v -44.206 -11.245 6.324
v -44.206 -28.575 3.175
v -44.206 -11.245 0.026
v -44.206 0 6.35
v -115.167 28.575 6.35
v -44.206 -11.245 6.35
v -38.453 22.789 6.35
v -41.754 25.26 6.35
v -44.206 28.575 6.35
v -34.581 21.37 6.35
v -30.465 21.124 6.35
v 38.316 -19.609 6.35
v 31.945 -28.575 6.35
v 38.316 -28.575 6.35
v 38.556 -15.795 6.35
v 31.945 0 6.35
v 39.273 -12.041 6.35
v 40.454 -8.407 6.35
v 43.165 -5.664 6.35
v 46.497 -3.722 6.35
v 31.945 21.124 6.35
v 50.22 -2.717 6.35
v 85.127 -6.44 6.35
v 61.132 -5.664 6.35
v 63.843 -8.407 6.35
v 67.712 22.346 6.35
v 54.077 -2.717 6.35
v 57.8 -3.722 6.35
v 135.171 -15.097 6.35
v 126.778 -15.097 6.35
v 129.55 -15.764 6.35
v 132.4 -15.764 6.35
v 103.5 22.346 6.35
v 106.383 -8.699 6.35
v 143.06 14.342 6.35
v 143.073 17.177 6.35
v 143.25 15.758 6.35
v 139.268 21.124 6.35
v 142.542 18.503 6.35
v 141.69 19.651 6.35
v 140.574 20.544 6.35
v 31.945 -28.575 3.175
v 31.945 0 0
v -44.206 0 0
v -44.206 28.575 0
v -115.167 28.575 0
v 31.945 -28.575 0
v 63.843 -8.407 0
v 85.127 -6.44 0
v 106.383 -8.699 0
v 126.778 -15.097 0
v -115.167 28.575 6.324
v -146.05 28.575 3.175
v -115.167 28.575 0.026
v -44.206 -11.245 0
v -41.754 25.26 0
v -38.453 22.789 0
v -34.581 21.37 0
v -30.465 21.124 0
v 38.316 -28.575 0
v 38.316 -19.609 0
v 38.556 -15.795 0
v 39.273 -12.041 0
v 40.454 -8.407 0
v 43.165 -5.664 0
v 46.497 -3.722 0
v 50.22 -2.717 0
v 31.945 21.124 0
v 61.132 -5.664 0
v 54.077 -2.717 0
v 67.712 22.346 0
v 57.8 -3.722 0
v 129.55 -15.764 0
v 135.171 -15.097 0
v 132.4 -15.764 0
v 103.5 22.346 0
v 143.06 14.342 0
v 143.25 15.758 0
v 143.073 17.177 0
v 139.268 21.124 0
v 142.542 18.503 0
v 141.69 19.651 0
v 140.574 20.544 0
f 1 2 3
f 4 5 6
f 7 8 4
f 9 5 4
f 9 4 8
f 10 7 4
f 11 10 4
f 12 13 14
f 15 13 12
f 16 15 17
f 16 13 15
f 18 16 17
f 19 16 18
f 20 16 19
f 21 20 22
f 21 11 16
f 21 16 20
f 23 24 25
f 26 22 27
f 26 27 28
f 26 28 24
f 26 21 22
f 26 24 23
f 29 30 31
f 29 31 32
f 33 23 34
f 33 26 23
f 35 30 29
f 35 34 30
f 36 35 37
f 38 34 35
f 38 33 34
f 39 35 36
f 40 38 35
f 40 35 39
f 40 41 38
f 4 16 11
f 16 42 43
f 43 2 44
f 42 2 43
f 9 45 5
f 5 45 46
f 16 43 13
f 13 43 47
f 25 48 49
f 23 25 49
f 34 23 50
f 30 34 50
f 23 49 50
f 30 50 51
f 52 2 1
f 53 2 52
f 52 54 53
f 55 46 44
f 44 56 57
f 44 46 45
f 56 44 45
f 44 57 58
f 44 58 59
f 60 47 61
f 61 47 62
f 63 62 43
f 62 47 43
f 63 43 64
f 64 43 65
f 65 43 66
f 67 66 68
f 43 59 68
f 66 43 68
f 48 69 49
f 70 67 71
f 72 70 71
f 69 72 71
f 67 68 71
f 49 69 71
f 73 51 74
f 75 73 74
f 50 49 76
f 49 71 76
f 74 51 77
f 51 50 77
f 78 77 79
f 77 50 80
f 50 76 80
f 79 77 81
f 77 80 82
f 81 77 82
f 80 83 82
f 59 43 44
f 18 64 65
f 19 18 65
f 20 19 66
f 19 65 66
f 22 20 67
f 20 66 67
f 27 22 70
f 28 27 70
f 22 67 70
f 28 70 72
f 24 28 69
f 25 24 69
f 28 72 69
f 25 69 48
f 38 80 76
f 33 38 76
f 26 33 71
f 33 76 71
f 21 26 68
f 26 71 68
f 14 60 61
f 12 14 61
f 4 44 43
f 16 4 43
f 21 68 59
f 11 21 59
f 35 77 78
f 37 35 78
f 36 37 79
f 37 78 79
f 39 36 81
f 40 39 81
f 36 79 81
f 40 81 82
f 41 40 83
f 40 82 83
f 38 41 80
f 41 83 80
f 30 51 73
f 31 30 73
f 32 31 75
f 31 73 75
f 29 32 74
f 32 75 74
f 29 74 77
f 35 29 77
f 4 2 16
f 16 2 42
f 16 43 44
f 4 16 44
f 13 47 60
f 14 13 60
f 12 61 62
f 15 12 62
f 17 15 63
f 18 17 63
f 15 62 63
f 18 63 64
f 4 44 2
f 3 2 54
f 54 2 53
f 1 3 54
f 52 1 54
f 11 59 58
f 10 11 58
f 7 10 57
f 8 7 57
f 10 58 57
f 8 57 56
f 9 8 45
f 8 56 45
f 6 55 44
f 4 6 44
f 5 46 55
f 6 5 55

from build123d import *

# Parameters (mm, degrees)
F1_DEPTH    = 6.35
F2_DEPTH    = 6.35
F3_T1_DEPTH = 195.9699169872
F4_DEPTH    = 6.35
F5_SIZE2    = 3.17499
F5_SIZE     = 28.57499
F5_2_SIZE2  = 3.17499
F5_2_SIZE   = 28.57499


# Not quite as in the source:
# - a fillet or chamfer that OpenCascade refuses, or shapes differently, is made with other operations: its cross-section is extruded or revolved along the edge and cut away or added
# - a fillet or chamfer is up to 0.001 mm smaller than in the source, because OpenCascade refuses the exact size


with BuildPart() as f1:
    # F0 (on Top) → F1 (new body)
    with BuildSketch(Plane.XY):
        with BuildLine():
            Line((31.9449827075, -10.0934877992), (31.9449827075, -28.575))
            Line((31.9449827075, -28.575), (38.3159667253, -28.575))
            Line((38.3159667253, -28.575), (38.3159667253, -19.608527422))
            ThreePointArc((38.3159667253, -19.608527422), (38.8553616261, -13.9065356822), (40.4544100165, -8.4068356082))
            ThreePointArc((40.4544100165, -8.4068356082), (52.1485507488, -2.5894110081), (63.8426914811, -8.4068356082))
            ThreePointArc((63.8426914811, -8.4068356082), (95.8112011226, -7.0427415694), (126.7784386873, -15.0973401847))
            ThreePointArc((126.7784386873, -15.0973401847), (130.9749132386, -15.8486915066), (135.1713877899, -15.0973401847))
            Line((135.1713877899, -15.0973401847), (143.0604755878, 14.3419522792))
            ThreePointArc((143.0604755878, 14.3419522792), (142.541612074, 18.5032028423), (139.2677277327, 21.1236812174))
            ThreePointArc((139.2677277327, 21.1236812174), (85.6063552201, 22.499320446), (31.9449827075, 21.1236812174))
            Line((31.9449827075, 21.1236812174), (-30.4647367448, 21.1236812174))
            ThreePointArc((-30.4647367448, 21.1236812174), (-38.4526509093, 22.7886386215), (-44.2056395113, 28.575))
            Line((-44.2056395113, 28.575), (-115.1673197746, 28.575))
            Line((-115.1673197746, 28.575), (-44.2056395113, -11.245172738))
            Line((-44.2056395113, -11.245172738), (-44.2056395113, 0))
            Line((-44.2056395113, 0), (31.9449827075, 0))
            Line((31.9449827075, 0), (31.9449827075, -10.0934877992))
        make_face()
    extrude(amount=F1_DEPTH)


with BuildPart() as f2:
    # F0 (on Top) → F2 (new body)
    with BuildSketch(Plane.XY):
        Polygon((-146.05, 28.575), (-44.2056395113, -28.575), (-44.2056395113, -11.245172738), (-115.1673197746, 28.575), align=None)
    extrude(amount=F2_DEPTH)

    # F3: chamfer of 3.175 x 15.24 on 2 edges, made by hand

    # F3_s2 → F3_t1 (cut)
    with BuildSketch(Plane(origin=(-157.7971410428, 88.547923197, 0), x_dir=(0, 0, 1), z_dir=(0.8720780049, -0.4893668903, 0))):
        Polygon((3.175, 46.5524053311), (6.35, 31.3124053311), (6.35, 46.5524053311), align=None)
        Polygon((3.175, 46.5524053311), (0, 31.3124053311), (0, 46.5524053311), align=None)
    extrude(amount=F3_T1_DEPTH, mode=Mode.SUBTRACT)


with BuildPart() as f4:
    # F0 (on Top) → F4 (new body)
    with BuildSketch(Plane.XY):
        Polygon((-44.2056395113, -11.245172738), (-44.2056395113, -28.575), (31.9449827075, -28.575), (31.9449827075, -10.0934877992), (31.9449827075, 0), (-44.2056395113, 0), align=None)
    extrude(amount=F4_DEPTH)

    # F5 (size 28.575 and 3.175 in the source; OpenCascade refuses exactly that, so slightly less here)
    f5_edges = [f4.edges().sort_by_distance(p)[0] for p in [
        (-6.130328, -28.575, 6.35),
    ]]
    f5_side = f4.faces().sort_by_distance((-6.130328, -14.2875, 6.35))[0]
    chamfer(f5_edges, length=F5_SIZE, length2=F5_SIZE2, reference=f5_side)

    # F5#2 (size 28.575 and 3.175 in the source; OpenCascade refuses exactly that, so slightly less here)
    f5_2_edges = [f4.edges().sort_by_distance(p)[0] for p in [
        (-6.130328, -28.575, 0),
    ]]
    f5_2_side = f4.faces().sort_by_distance((-6.130328, -14.2875, 0))[0]
    chamfer(f5_2_edges, length=F5_2_SIZE, length2=F5_2_SIZE2, reference=f5_2_side)


solid = Compound([f1.part, f2.part, f4.part])
